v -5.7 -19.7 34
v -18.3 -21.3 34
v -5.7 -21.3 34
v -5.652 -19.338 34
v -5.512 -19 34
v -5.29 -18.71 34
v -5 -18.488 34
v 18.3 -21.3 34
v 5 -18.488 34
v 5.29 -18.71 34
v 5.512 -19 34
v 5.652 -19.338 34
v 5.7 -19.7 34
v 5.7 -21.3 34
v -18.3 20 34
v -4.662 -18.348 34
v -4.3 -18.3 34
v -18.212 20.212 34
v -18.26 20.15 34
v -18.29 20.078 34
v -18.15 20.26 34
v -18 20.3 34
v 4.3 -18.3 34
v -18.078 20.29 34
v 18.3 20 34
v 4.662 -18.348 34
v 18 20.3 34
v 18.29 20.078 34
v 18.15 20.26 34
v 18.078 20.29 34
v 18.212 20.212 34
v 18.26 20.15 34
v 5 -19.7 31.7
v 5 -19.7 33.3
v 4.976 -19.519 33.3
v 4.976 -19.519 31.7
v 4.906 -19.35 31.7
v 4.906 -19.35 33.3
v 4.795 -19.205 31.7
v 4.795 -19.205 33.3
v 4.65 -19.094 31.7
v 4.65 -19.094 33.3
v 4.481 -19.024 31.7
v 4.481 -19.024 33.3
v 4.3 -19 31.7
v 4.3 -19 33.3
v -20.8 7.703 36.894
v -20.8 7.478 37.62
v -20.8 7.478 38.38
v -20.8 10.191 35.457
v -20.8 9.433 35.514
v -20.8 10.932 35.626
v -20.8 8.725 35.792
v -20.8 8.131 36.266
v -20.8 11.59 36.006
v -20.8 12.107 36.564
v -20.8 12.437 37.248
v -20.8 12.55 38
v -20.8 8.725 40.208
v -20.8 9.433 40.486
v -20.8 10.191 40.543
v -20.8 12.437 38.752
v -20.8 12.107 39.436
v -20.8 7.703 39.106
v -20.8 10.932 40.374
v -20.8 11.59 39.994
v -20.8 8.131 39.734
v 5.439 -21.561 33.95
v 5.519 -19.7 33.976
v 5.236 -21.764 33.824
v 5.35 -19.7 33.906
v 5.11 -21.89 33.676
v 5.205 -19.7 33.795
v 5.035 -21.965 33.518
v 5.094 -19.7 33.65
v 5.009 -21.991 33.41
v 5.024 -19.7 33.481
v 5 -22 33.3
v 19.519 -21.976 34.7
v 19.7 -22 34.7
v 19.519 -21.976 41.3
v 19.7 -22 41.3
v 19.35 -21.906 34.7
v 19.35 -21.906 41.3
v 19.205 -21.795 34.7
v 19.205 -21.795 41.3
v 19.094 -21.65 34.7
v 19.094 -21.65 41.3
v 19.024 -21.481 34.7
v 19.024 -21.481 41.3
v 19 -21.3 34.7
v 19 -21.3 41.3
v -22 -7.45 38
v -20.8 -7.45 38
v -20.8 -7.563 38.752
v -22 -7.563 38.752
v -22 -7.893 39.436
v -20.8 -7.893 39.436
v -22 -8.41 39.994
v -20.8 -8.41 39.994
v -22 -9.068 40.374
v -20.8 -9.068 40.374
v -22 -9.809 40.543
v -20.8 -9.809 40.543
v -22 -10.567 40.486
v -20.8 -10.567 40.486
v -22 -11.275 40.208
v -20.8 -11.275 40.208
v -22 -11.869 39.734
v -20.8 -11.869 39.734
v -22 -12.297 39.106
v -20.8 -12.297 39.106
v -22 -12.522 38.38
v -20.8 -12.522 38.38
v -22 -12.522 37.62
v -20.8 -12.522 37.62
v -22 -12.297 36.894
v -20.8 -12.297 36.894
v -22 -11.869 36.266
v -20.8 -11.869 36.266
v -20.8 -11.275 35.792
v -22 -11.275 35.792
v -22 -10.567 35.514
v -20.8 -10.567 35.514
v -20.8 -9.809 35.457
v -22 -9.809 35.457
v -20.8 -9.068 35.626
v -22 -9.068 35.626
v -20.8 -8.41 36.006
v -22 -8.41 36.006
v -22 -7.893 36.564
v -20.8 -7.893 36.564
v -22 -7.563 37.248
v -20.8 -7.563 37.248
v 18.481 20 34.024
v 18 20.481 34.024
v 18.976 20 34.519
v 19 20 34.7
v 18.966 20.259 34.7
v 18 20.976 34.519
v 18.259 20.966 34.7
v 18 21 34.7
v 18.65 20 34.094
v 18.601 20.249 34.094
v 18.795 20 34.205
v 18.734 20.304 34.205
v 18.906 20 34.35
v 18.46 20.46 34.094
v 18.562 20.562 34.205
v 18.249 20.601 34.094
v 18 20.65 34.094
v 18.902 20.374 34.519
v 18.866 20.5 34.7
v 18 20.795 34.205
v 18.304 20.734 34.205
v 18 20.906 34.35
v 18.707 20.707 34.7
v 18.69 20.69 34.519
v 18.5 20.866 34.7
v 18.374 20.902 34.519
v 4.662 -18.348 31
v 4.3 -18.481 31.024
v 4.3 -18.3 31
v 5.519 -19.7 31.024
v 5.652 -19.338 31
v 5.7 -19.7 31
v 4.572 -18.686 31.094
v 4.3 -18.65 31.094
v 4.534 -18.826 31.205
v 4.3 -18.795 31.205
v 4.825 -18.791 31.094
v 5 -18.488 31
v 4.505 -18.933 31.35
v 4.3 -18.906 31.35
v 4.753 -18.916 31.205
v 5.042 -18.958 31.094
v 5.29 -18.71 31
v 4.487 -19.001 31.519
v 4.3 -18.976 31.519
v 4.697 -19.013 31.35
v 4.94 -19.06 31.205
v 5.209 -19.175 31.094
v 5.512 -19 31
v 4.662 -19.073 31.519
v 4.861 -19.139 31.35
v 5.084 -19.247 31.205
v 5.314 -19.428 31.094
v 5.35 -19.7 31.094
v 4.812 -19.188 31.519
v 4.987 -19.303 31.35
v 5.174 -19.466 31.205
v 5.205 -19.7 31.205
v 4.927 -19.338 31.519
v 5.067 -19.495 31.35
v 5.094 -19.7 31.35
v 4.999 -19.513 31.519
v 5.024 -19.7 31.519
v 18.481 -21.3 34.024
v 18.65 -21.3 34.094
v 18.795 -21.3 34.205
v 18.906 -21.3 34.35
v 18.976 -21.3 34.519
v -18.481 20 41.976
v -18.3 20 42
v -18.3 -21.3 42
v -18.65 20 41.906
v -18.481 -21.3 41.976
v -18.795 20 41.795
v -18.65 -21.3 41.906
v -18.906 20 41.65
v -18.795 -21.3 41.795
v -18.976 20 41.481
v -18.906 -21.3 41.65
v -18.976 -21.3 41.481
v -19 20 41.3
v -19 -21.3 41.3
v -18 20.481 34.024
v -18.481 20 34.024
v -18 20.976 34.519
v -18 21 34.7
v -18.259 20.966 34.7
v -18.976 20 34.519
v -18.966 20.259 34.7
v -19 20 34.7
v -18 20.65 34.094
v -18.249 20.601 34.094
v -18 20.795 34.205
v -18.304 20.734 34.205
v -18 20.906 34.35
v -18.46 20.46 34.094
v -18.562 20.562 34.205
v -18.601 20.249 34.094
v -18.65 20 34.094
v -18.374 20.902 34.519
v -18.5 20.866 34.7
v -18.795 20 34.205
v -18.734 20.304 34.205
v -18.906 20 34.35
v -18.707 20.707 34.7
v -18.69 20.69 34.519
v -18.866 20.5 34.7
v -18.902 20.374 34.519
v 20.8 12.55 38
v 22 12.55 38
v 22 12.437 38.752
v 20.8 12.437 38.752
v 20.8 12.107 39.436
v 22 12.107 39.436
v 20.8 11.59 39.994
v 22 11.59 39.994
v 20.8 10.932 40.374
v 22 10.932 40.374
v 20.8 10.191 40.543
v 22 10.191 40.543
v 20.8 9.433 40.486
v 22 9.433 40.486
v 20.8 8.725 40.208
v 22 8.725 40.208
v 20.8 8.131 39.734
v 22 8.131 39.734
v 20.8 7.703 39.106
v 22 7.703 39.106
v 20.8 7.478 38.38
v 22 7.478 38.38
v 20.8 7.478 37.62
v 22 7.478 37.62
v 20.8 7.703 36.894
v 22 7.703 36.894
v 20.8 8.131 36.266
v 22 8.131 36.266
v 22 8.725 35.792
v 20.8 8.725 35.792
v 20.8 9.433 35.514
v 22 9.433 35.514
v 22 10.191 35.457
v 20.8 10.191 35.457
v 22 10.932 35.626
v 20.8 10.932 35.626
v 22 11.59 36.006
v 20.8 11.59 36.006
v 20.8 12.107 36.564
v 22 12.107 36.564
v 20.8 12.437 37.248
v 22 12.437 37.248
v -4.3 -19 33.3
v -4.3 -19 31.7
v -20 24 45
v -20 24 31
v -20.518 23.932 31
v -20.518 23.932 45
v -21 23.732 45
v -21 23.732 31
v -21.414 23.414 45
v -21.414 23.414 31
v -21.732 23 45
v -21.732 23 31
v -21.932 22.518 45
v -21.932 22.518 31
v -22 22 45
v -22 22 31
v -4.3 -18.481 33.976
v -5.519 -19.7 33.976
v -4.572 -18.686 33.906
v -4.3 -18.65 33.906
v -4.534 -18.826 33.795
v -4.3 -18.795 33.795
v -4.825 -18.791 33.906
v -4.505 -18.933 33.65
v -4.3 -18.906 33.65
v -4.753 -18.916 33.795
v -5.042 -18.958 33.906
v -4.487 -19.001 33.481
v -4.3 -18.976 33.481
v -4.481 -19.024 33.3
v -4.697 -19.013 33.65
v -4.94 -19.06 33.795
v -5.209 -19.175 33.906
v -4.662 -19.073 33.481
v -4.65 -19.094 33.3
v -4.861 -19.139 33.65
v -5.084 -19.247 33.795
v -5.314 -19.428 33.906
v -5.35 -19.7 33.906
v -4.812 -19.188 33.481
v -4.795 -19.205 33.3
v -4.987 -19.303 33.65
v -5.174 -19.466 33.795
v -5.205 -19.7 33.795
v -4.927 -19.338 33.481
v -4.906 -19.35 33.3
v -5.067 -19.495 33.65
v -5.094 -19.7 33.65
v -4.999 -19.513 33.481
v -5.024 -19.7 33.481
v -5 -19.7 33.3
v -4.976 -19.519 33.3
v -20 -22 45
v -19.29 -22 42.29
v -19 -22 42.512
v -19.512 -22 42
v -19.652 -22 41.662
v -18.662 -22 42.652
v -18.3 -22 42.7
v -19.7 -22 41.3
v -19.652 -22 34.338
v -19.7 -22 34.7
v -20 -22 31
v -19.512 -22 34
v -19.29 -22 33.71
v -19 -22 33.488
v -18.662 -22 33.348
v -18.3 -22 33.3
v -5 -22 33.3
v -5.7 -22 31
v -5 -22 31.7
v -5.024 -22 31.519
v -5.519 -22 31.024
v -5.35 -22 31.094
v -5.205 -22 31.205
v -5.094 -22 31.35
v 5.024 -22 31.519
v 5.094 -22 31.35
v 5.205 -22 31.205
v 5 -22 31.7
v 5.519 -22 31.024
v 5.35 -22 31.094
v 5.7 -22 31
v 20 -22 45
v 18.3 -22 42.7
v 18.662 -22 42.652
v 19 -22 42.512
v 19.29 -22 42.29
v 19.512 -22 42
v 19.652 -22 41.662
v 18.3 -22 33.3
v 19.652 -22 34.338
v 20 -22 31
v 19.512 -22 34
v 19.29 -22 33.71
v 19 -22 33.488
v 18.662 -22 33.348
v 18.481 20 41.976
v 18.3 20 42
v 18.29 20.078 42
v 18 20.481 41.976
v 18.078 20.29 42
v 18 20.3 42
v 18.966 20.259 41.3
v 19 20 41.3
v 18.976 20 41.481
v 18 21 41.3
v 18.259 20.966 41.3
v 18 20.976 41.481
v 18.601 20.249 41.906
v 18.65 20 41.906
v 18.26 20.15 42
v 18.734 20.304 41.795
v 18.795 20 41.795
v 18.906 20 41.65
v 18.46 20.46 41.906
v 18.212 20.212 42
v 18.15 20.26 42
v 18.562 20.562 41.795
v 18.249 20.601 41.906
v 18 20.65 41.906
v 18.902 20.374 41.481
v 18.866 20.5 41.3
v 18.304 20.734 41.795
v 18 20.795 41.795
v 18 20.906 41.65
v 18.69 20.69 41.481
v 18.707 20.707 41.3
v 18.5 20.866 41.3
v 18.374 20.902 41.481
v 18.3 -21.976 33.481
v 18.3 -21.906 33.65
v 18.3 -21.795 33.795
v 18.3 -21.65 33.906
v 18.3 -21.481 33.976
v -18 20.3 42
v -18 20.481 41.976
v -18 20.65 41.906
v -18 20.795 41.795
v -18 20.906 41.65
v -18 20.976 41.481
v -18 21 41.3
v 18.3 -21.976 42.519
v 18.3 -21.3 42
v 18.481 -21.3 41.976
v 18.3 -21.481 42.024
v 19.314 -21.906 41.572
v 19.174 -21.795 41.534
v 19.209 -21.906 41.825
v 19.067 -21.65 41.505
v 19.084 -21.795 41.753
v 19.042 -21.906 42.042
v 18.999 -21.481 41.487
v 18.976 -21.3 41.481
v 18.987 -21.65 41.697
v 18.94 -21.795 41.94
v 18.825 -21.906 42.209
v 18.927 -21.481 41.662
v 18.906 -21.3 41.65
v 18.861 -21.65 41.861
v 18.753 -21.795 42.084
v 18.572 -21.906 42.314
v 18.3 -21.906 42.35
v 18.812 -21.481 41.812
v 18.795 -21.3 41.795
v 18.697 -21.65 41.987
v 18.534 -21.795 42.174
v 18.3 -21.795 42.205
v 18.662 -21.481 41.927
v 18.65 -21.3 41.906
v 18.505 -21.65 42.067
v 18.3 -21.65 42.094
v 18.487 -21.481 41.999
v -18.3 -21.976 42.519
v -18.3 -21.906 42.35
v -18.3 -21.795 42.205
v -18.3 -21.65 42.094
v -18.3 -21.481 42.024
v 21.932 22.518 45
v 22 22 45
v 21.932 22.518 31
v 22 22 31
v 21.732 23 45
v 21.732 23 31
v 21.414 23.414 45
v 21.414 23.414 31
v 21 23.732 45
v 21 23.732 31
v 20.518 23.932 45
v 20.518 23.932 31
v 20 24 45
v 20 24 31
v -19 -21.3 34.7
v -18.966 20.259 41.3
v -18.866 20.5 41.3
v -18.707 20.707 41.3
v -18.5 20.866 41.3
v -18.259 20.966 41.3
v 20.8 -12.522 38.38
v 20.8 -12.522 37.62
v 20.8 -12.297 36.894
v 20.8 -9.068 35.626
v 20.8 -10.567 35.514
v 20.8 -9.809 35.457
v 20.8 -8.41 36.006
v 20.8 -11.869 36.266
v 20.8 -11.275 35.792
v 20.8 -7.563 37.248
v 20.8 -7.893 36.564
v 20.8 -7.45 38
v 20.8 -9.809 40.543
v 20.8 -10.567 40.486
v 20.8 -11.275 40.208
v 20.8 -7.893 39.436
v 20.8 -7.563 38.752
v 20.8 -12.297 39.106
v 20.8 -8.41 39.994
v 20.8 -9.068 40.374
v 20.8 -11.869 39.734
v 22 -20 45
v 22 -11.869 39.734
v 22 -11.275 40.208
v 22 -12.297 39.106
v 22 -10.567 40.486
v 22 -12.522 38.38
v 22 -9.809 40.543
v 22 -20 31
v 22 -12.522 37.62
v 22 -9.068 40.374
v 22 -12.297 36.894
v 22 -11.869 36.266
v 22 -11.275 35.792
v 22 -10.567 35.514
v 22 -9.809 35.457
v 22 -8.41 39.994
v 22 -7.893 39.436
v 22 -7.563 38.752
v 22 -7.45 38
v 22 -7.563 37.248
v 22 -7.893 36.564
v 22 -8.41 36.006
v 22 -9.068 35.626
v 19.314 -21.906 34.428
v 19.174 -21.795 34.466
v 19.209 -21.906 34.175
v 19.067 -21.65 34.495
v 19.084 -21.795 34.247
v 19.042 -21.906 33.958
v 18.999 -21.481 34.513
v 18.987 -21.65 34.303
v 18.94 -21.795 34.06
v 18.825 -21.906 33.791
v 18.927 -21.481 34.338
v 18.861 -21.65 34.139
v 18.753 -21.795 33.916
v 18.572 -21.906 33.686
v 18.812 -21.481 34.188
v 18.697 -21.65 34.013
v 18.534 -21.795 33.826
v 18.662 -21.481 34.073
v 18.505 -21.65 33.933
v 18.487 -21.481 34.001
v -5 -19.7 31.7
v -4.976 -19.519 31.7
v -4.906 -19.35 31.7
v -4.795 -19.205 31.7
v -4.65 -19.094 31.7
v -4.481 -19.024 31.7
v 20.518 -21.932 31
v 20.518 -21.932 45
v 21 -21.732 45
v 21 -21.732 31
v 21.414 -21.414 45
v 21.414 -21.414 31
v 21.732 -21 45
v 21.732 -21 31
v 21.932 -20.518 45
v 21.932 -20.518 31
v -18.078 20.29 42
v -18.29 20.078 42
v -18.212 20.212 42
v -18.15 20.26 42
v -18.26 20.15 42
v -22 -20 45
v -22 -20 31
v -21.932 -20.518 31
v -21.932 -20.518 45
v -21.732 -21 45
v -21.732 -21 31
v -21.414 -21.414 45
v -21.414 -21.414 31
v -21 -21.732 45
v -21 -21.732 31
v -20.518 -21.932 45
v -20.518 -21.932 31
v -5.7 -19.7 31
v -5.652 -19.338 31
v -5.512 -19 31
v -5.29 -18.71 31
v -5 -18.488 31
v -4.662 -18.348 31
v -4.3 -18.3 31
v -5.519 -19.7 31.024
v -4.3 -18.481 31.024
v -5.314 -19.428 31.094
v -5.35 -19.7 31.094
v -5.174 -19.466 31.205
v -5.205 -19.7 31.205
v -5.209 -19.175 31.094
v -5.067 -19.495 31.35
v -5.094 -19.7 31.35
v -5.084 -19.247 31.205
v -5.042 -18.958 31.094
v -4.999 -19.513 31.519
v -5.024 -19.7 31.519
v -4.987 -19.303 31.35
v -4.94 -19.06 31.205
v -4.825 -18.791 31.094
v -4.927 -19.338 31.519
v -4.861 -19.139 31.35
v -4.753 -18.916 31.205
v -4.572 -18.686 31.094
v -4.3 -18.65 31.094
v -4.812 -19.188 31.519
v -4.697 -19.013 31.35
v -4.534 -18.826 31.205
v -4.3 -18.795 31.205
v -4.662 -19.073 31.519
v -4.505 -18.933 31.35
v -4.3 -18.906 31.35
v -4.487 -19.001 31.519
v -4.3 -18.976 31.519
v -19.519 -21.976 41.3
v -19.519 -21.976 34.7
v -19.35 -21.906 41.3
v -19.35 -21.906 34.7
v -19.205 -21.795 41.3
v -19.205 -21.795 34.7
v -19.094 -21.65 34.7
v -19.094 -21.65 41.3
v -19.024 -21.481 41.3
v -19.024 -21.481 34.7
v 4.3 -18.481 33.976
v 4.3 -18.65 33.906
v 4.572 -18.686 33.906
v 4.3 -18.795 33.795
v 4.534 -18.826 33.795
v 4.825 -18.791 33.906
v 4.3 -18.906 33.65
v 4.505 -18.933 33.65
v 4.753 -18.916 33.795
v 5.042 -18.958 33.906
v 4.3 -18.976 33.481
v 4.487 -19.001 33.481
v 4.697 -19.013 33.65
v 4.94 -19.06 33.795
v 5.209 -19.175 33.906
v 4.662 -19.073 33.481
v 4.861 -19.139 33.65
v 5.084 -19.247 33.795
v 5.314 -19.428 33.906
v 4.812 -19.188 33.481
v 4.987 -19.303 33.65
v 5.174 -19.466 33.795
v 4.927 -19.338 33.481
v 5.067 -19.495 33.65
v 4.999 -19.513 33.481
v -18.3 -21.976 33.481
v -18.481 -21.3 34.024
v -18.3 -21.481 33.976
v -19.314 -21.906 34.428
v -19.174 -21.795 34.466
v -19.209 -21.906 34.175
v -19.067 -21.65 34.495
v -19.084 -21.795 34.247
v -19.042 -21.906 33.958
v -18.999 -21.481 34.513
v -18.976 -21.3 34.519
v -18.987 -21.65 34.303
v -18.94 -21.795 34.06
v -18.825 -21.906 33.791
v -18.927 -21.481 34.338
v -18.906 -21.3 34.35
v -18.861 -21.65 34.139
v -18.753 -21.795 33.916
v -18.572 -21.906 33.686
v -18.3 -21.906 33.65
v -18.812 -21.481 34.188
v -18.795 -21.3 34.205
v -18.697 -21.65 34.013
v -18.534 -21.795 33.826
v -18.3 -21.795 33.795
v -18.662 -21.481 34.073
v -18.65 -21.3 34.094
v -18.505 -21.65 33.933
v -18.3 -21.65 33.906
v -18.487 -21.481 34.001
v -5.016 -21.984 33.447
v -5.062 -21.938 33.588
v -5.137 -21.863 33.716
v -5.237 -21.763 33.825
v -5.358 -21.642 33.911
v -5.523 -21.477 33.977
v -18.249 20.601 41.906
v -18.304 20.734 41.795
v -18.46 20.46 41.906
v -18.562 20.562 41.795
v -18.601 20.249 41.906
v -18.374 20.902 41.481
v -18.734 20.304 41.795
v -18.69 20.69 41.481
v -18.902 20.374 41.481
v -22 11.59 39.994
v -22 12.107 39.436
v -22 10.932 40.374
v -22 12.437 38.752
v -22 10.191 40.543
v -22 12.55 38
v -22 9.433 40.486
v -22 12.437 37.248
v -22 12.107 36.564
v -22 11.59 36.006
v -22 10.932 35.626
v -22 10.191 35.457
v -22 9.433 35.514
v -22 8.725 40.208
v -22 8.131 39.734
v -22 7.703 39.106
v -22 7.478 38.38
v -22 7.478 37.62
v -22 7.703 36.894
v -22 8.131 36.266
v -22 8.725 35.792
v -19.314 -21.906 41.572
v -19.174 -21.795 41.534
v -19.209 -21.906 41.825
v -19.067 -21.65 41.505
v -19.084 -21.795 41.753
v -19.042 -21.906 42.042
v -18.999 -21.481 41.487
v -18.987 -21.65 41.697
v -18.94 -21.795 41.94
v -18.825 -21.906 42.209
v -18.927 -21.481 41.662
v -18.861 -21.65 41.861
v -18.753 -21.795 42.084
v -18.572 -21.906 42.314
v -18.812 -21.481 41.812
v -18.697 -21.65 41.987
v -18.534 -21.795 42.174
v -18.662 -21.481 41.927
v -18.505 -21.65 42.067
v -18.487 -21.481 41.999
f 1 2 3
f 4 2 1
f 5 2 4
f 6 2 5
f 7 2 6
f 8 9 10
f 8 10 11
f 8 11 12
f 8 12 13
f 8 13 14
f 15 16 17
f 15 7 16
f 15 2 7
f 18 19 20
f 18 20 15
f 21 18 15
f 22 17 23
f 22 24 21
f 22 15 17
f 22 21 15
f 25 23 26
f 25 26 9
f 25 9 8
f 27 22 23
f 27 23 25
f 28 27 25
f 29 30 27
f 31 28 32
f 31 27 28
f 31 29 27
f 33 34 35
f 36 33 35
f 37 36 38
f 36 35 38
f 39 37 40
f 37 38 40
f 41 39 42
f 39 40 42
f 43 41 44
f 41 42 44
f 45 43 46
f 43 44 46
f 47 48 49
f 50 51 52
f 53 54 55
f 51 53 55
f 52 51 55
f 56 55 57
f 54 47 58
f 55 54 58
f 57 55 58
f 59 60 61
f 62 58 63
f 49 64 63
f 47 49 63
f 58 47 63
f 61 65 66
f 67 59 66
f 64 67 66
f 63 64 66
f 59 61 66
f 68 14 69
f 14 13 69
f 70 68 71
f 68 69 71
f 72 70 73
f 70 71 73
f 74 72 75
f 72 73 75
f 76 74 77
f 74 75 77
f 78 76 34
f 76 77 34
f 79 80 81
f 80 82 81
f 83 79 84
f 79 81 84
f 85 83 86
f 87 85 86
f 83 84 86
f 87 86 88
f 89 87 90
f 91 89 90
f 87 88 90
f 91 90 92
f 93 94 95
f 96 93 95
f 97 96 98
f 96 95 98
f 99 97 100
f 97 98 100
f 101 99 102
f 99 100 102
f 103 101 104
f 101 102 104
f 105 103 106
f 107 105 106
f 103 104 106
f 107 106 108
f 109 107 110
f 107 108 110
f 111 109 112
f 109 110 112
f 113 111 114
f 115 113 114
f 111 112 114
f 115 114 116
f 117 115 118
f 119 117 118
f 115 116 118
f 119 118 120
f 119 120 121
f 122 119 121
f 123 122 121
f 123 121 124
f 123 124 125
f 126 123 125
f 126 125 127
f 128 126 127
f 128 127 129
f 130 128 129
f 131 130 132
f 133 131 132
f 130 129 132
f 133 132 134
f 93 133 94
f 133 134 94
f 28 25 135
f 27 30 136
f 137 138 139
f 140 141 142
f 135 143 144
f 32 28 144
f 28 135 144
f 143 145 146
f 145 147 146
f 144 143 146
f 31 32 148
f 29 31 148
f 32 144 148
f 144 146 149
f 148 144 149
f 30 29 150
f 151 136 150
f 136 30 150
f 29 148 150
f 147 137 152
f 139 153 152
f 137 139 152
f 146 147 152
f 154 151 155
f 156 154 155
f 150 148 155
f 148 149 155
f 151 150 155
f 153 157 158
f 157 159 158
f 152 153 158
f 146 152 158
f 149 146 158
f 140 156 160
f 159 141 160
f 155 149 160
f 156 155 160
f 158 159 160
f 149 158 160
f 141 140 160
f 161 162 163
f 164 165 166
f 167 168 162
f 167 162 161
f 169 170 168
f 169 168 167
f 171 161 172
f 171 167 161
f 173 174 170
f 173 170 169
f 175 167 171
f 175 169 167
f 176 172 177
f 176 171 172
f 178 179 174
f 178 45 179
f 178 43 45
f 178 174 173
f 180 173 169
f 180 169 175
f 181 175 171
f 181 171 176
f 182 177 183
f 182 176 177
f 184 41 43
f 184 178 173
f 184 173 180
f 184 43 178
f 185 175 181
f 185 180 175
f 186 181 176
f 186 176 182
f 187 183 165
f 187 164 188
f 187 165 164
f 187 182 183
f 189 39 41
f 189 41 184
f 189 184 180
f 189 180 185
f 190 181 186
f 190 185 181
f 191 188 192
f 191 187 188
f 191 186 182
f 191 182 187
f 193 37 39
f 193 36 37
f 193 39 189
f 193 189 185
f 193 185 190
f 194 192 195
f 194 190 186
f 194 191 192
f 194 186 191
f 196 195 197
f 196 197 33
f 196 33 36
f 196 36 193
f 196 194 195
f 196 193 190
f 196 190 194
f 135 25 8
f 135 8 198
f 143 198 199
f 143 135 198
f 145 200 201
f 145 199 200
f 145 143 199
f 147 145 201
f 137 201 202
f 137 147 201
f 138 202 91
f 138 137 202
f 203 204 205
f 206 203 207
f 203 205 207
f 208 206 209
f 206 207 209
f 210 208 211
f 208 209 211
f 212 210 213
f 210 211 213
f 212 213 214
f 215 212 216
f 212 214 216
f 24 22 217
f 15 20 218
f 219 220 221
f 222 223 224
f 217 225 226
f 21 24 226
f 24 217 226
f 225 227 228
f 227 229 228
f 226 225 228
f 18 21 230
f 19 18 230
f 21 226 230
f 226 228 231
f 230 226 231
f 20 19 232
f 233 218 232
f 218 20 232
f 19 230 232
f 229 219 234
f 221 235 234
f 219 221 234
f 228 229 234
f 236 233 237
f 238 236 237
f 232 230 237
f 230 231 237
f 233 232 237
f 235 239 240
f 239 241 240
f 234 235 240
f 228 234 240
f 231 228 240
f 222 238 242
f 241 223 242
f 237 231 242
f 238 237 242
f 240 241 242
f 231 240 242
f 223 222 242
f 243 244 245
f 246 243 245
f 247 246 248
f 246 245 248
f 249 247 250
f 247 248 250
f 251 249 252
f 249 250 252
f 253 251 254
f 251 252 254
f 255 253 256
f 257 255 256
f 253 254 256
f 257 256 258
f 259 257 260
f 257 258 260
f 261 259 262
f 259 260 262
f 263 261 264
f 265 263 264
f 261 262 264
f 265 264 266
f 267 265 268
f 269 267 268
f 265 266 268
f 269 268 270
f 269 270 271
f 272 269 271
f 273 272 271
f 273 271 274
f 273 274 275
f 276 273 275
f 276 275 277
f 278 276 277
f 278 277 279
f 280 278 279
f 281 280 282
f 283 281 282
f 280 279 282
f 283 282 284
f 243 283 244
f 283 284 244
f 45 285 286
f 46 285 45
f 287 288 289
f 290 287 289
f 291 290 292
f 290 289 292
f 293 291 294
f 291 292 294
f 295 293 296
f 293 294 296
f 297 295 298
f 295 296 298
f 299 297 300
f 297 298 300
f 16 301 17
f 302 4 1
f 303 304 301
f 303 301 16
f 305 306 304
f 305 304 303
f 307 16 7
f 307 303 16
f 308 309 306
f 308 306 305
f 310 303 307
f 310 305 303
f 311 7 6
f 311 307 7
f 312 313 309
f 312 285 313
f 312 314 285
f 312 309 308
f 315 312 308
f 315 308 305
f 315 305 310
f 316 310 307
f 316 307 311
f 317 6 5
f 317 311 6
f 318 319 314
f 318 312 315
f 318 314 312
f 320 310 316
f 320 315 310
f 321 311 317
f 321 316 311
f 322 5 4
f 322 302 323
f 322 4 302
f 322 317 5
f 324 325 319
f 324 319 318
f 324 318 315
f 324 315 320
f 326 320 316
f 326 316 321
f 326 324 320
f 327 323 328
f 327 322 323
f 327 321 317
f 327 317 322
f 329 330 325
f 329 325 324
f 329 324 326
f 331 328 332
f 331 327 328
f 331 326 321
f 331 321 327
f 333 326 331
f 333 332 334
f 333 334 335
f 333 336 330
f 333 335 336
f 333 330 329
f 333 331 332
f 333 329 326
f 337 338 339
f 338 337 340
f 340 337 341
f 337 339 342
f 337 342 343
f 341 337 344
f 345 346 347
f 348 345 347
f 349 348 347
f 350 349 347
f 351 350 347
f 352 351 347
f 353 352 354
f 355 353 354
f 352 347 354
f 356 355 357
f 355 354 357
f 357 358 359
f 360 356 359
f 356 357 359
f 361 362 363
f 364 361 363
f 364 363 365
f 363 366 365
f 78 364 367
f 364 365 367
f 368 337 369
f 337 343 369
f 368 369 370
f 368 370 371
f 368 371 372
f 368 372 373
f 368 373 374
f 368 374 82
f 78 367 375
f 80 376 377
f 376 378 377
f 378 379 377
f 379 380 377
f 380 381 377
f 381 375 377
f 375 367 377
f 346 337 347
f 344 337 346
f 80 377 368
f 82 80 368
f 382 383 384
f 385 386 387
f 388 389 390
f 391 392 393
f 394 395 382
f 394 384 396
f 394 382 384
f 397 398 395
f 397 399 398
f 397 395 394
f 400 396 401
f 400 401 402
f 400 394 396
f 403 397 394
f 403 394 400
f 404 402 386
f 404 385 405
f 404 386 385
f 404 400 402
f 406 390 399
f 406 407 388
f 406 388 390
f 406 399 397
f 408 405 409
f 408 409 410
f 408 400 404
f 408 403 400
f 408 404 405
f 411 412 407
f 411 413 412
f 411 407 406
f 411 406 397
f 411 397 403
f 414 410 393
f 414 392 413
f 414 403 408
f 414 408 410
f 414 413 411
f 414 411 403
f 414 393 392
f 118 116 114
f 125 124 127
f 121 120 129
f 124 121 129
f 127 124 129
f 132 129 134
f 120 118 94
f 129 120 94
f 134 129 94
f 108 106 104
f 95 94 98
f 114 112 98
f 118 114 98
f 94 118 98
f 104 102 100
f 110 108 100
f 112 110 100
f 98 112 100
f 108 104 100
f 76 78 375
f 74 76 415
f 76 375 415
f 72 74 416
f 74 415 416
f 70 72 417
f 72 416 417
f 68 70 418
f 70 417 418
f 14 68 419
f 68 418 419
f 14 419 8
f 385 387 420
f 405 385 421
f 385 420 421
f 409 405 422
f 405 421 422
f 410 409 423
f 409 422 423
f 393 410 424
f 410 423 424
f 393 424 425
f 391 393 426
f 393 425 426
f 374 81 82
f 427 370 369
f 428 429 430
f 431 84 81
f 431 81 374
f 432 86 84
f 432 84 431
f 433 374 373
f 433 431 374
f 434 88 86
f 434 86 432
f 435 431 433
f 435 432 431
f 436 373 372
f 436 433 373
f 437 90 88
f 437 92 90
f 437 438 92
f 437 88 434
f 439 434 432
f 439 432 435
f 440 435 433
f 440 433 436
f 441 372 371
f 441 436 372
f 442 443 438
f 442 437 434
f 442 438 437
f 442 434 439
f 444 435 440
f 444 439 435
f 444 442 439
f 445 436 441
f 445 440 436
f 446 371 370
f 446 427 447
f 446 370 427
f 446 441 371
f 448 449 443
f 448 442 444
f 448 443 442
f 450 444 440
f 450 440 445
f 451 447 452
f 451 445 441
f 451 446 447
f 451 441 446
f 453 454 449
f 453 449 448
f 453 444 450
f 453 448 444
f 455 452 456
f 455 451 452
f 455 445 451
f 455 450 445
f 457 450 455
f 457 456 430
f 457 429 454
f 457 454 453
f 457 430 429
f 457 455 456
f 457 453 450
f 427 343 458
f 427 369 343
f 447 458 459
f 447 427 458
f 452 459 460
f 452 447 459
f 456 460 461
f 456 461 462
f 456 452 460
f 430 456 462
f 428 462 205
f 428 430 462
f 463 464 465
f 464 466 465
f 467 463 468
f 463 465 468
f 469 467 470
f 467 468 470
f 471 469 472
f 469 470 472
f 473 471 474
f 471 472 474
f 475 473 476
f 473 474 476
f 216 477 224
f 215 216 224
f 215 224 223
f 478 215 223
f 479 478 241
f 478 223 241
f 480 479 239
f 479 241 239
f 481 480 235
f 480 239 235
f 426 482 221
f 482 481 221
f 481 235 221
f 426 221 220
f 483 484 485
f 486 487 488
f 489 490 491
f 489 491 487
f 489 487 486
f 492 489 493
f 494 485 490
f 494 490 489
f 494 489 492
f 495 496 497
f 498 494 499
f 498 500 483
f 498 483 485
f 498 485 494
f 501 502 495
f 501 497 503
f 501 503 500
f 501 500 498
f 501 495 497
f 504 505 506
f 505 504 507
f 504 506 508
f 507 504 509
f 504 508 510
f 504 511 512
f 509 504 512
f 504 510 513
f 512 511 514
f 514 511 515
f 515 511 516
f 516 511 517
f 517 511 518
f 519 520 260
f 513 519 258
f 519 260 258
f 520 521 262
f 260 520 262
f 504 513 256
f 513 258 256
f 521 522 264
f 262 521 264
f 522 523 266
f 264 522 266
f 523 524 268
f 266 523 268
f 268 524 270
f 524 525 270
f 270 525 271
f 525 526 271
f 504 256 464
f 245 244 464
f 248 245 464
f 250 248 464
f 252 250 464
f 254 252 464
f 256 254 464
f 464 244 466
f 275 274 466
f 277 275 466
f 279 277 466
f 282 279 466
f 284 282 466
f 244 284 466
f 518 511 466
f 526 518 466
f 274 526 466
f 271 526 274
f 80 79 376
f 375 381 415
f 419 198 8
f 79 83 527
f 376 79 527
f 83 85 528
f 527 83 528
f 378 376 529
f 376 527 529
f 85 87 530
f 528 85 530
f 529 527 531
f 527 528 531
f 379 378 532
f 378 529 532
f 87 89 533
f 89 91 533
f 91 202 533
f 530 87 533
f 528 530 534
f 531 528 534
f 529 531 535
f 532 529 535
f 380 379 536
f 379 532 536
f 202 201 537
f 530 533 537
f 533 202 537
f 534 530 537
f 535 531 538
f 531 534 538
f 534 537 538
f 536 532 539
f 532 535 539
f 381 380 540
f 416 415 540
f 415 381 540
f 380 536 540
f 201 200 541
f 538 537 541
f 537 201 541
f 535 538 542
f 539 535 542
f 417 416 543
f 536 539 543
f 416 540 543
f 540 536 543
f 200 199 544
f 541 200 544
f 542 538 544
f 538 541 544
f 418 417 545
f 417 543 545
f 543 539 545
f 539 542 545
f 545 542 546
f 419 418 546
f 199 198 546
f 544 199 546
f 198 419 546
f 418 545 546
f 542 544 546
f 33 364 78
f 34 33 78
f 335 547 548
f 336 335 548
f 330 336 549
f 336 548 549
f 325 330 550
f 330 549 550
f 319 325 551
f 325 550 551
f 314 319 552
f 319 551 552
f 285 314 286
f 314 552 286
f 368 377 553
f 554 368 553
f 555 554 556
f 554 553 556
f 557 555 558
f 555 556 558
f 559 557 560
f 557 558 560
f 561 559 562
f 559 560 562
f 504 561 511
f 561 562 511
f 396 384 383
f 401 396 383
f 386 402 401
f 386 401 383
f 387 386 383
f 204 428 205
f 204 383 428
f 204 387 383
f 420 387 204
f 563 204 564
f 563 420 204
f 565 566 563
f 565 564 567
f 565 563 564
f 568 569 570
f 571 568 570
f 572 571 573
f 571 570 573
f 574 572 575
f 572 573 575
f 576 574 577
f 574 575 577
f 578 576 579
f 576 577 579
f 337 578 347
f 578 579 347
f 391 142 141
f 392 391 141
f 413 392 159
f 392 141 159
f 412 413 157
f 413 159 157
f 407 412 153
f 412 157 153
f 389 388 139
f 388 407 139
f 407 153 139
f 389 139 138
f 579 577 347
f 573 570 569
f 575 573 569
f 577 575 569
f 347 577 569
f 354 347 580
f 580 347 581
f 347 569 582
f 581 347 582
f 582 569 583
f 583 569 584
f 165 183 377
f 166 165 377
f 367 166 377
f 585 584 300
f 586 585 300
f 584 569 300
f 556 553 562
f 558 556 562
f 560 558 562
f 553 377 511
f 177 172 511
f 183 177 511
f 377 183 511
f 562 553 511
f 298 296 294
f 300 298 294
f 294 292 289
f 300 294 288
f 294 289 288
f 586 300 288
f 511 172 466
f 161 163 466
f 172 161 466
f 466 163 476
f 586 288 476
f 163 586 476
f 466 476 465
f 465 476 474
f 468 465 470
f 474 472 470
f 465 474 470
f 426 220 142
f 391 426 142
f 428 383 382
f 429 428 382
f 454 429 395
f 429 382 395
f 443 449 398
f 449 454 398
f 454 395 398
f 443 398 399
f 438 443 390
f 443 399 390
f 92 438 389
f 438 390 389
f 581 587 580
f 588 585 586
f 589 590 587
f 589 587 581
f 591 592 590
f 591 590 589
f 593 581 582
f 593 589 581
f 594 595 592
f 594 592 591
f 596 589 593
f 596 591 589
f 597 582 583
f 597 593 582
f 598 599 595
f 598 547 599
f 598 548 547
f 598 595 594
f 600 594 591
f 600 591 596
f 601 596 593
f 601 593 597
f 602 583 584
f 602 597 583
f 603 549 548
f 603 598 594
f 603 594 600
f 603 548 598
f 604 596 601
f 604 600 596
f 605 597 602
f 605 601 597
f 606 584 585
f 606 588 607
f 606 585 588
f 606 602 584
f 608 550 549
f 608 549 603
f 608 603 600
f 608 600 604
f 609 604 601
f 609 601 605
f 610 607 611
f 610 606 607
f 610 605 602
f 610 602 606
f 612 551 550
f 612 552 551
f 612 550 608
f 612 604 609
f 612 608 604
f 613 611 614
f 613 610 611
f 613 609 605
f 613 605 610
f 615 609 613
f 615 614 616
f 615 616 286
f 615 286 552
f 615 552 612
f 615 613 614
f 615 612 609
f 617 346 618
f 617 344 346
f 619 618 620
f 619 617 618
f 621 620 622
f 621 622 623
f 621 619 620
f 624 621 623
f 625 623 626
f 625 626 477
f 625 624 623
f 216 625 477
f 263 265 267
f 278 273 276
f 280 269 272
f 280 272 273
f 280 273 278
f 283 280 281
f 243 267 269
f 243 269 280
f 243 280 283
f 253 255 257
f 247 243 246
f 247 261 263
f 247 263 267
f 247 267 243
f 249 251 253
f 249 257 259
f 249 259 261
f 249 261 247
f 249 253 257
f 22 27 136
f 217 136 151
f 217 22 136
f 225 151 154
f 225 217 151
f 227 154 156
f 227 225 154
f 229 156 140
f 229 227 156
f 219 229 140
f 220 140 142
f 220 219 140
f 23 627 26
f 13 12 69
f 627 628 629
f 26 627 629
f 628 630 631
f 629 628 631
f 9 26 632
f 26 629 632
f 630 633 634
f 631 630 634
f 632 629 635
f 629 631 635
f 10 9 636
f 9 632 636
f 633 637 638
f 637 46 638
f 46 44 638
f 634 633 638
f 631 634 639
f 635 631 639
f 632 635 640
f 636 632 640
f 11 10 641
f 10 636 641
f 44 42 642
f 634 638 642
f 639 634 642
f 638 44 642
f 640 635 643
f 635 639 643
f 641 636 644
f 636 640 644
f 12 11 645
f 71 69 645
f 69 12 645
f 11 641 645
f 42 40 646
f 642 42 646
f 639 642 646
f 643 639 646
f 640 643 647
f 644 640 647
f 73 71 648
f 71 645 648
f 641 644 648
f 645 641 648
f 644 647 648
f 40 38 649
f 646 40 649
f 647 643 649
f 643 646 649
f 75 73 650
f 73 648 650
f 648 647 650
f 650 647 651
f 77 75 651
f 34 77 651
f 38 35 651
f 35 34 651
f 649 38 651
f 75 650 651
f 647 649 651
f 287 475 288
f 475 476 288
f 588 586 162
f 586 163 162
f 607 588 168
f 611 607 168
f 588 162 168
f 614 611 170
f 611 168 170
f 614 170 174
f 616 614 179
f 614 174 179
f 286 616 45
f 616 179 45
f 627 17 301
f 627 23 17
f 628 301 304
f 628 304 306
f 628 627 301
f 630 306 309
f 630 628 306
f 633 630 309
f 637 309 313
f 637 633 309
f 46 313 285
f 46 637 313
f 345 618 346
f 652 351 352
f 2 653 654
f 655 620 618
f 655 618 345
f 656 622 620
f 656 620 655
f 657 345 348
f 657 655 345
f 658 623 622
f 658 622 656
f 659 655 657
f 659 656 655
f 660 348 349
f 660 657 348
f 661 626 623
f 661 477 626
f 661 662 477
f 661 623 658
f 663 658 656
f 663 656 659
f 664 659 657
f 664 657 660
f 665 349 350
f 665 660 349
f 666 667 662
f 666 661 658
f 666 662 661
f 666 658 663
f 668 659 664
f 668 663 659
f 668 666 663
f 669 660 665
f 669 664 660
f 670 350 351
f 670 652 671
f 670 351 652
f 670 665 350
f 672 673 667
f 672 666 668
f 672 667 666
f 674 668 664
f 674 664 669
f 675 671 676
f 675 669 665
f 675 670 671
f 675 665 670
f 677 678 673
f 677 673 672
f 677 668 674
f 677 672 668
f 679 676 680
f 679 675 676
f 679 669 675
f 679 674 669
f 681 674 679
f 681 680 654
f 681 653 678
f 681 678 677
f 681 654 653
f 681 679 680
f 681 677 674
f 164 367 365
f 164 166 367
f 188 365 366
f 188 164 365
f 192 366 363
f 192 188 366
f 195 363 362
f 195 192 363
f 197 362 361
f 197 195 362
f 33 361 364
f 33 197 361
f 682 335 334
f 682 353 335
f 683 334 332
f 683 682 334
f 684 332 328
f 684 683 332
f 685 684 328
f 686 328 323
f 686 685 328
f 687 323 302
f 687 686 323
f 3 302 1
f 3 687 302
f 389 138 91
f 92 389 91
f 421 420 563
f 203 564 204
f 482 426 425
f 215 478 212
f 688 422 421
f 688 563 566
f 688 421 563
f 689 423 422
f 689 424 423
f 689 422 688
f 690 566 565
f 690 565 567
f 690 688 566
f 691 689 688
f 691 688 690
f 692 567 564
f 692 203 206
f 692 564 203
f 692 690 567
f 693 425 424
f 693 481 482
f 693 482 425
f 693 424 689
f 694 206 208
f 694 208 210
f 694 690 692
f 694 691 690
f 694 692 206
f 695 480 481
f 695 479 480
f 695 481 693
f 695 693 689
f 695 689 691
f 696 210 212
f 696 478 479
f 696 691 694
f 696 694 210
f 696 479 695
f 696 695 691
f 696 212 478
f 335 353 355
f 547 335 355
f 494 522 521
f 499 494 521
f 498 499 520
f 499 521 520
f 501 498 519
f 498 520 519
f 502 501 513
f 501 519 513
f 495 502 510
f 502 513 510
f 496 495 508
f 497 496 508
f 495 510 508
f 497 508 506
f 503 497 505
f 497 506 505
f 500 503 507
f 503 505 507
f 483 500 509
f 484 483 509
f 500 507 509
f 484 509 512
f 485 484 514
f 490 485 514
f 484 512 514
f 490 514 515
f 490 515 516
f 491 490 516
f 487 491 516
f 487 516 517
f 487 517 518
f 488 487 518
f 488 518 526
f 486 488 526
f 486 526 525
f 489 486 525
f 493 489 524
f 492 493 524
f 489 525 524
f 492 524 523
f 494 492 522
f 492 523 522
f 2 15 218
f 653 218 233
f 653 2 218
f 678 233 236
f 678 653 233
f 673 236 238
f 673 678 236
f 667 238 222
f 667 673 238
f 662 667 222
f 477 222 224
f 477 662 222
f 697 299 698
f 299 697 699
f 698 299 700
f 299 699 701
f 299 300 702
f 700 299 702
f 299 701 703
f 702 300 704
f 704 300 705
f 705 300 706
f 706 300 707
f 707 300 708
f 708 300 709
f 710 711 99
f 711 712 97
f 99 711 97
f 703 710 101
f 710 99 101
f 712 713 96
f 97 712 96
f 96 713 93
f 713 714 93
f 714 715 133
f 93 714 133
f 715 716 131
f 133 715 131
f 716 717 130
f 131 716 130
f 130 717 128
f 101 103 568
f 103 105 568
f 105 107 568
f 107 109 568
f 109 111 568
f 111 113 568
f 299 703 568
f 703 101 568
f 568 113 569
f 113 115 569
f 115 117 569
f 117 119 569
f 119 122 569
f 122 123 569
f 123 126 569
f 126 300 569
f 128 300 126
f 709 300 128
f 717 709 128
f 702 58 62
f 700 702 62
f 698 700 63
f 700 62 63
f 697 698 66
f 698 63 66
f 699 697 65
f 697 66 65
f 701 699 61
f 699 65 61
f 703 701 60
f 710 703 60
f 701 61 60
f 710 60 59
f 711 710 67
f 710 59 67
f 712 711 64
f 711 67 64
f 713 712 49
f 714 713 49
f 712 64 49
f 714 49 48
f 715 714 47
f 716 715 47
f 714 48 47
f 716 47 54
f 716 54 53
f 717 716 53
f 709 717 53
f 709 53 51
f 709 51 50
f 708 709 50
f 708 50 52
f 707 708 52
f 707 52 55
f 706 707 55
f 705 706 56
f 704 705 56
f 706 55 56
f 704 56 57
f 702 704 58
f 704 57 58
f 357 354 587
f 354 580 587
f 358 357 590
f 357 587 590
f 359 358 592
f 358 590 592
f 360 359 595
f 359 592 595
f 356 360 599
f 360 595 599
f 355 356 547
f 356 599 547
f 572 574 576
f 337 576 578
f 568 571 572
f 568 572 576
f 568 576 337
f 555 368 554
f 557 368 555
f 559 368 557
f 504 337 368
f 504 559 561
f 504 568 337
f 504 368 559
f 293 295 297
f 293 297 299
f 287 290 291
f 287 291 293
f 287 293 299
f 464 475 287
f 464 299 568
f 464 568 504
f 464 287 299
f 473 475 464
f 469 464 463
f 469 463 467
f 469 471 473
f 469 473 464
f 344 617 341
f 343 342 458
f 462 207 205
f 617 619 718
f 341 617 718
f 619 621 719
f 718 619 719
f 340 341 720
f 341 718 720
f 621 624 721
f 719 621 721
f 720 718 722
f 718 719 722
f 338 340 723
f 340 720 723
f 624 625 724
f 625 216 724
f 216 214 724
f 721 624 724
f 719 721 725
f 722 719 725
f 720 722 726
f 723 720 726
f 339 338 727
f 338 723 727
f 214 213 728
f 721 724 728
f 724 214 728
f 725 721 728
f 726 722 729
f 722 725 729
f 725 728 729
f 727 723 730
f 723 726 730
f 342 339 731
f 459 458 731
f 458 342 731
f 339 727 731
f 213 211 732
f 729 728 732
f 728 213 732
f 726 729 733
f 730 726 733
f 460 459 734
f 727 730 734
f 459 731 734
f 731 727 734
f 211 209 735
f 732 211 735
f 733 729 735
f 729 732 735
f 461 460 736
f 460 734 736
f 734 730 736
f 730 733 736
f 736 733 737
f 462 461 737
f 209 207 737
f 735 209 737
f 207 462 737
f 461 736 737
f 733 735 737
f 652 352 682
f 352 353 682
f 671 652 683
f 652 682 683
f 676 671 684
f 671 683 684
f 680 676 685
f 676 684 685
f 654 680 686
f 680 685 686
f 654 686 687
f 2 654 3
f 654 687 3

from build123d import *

# Parameters (mm, degrees)
BOSS_EXTRUDE4_DEPTH = 3
BOSS_EXTRUDE5_DEPTH = 14
BOSS_EXTRUDE6_START = 11
BOSS_EXTRUDE6_DEPTH = 3
SKETCH2_W           = 10
SKETCH2_H           = 3
CUT_EXTRUDE1_DEPTH  = 3
CUT_EXTRUDE2_START  = 22
SKETCH3_R           = 2.55
CUT_EXTRUDE2_DEPTH  = 1.2
CUT_EXTRUDE3_START  = -20.8
SKETCH3_3_R         = 2.55
CUT_EXTRUDE3_DEPTH  = 1.2
FILLET1_R           = 0.7


with BuildPart() as part:
    # Sketch1 → Boss-Extrude4 (new body)
    with BuildSketch(Plane.XY.offset(31)):
        with BuildLine():
            ThreePointArc((-22, -20), (-21.414213562, -21.414213562), (-20, -22))
            Line((-20, -22), (20, -22))
            ThreePointArc((20, -22), (21.414213562, -21.414213562), (22, -20))
            Line((22, -20), (22, 22))
            ThreePointArc((22, 22), (21.414213562, 23.414213562), (20, 24))
            Line((20, 24), (-20, 24))
            ThreePointArc((-20, 24), (-21.414213562, 23.414213562), (-22, 22))
            Line((-22, 22), (-22, -20))
        make_face()
    extrude(amount=BOSS_EXTRUDE4_DEPTH)

    # Sketch1<3> → Boss-Extrude5 (add)
    with BuildSketch(Plane.XY.offset(31)):
        with BuildLine():
            Line((-22, -10.75), (-22, -20))
            ThreePointArc((-22, -20), (-21.414213562, -21.414213562), (-20, -22))
            Line((-20, -22), (-19, -22))
            Line((-19, -22), (-19, -18))
            Line((-19, -18), (-19, -10.75))
            Line((-19, -10.75), (-19, 10.75))
            Line((-19, 10.75), (-19, 20))
            ThreePointArc((-19, 20), (-18.707106781, 20.707106781), (-18, 21))
            Line((-18, 21), (-3.938916155, 21))
            Line((-3.938916155, 21), (3.938916155, 21))
            Line((3.938916155, 21), (18, 21))
            ThreePointArc((18, 21), (18.707106781, 20.707106781), (19, 20))
            Line((19, 20), (19, 10.75))
            Line((19, 10.75), (19, -10.75))
            Line((19, -10.75), (19, -18))
            Line((19, -18), (19, -22))
            Line((19, -22), (20, -22))
            ThreePointArc((20, -22), (21.414213562, -21.414213562), (22, -20))
            Line((22, -20), (22, -10.75))
            Line((22, -10.75), (22, 10.75))
            Line((22, 10.75), (22, 22))
            ThreePointArc((22, 22), (21.414213562, 23.414213562), (20, 24))
            Line((20, 24), (3.938916155, 24))
            Line((3.938916155, 24), (-3.938916155, 24))
            Line((-3.938916155, 24), (-20, 24))
            ThreePointArc((-20, 24), (-21.414213562, 23.414213562), (-22, 22))
            Line((-22, 22), (-22, 10.75))
            Line((-22, 10.75), (-22, -10.75))
        make_face()
    extrude(amount=BOSS_EXTRUDE5_DEPTH)

    # Sketch1<4> → Boss-Extrude6 (add)
    # profile 1 of 3: a face of its own
    with BuildSketch(Plane.XY.offset(31).offset(BOSS_EXTRUDE6_START)):
        with BuildLine():
            Line((-22, -20), (-22, -10.75))
            Line((-22, -10.75), (-22, 10.75))
            Line((-22, 10.75), (-22, 22))
            ThreePointArc((-22, 22), (-21.414213562, 23.414213562), (-20, 24))
            Line((-20, 24), (-3.938916155, 24))
            Line((-3.938916155, 24), (3.938916155, 24))
            Line((3.938916155, 24), (20, 24))
            ThreePointArc((20, 24), (21.414213562, 23.414213562), (22, 22))
            Line((22, 22), (22, 10.75))
            Line((22, 10.75), (22, -10.75))
            Line((22, -10.75), (22, -20))
            ThreePointArc((22, -20), (21.414213562, -21.414213562), (20, -22))
            Line((20, -22), (10.75, -22))
            Line((10.75, -22), (-10.75, -22))
            Line((-10.75, -22), (-20, -22))
            ThreePointArc((-20, -22), (-21.414213562, -21.414213562), (-22, -20))
        make_face()
        with BuildLine():
            ThreePointArc((-18, 21), (-18.707106781, 20.707106781), (-19, 20))
            Line((-19, 20), (-19, 10.75))
            Line((-19, 10.75), (-19, -10.75))
            Line((-19, -10.75), (-19, -18))
            ThreePointArc((-19, -18), (-18.707106781, -18.707106781), (-18, -19))
            Line((-18, -19), (-10.75, -19))
            Line((-10.75, -19), (10.75, -19))
            Line((10.75, -19), (18, -19))
            ThreePointArc((18, -19), (18.707106781, -18.707106781), (19, -18))
            Line((19, -18), (19, -10.75))
            Line((19, -10.75), (19, 10.75))
            Line((19, 10.75), (19, 20))
            ThreePointArc((19, 20), (18.707106781, 20.707106781), (18, 21))
            Line((18, 21), (3.938916155, 21))
            Line((3.938916155, 21), (-3.938916155, 21))
            Line((-3.938916155, 21), (-18, 21))
        make_face(mode=Mode.SUBTRACT)
    # profile 2 of 3: a face of its own
    with BuildSketch(Plane.XY.offset(31).offset(BOSS_EXTRUDE6_START)):
        with BuildLine():
            Line((-18, 21), (-3.938916155, 21))
            Line((-3.938916155, 21), (3.938916155, 21))
            Line((3.938916155, 21), (18, 21))
            ThreePointArc((18, 21), (18.707106781, 20.707106781), (19, 20))
            Line((19, 20), (19, 10.75))
            Line((19, 10.75), (19, -10.75))
            Line((19, -10.75), (19, -18))
            ThreePointArc((19, -18), (18.707106781, -18.707106781), (18, -19))
            Line((18, -19), (10.75, -19))
            Line((10.75, -19), (-10.75, -19))
            Line((-10.75, -19), (-18, -19))
            ThreePointArc((-18, -19), (-18.707106781, -18.707106781), (-19, -18))
            Line((-19, -18), (-19, -10.75))
            Line((-19, -10.75), (-19, 10.75))
            Line((-19, 10.75), (-19, 20))
            ThreePointArc((-19, 20), (-18.707106781, 20.707106781), (-18, 21))
        make_face()
    # profile 3 of 3: a face of its own
    with BuildSketch(Plane.XY.offset(31).offset(BOSS_EXTRUDE6_START)):
        with BuildLine():
            Line((-19, -18), (-19, -22))
            Line((-19, -22), (-10.75, -22))
            Line((-10.75, -22), (10.75, -22))
            Line((10.75, -22), (19, -22))
            Line((19, -22), (19, -18))
            ThreePointArc((19, -18), (18.707106781, -18.707106781), (18, -19))
            Line((18, -19), (10.75, -19))
            Line((10.75, -19), (-10.75, -19))
            Line((-10.75, -19), (-18, -19))
            ThreePointArc((-18, -19), (-18.707106781, -18.707106781), (-19, -18))
        make_face()
    extrude(amount=BOSS_EXTRUDE6_DEPTH)

    # Sketch2 → Cut-Extrude1 (cut)
    with BuildSketch(Plane.XZ.offset(22)):
        with Locations((0, 32.5)):
            Rectangle(SKETCH2_W, SKETCH2_H)
        with Locations((0, 35.5)):
            Rectangle(SKETCH2_W, SKETCH2_H)
    extrude(amount=-CUT_EXTRUDE1_DEPTH, mode=Mode.SUBTRACT)

    # Sketch3 → Cut-Extrude2 (cut)
    with BuildSketch(Plane(origin=(0, 0, 0), x_dir=(0, 0, -1), z_dir=(1, 0, 0)).offset(CUT_EXTRUDE2_START)):
        with Locations(Location((-38, 10, 0), (0, 0, 90))):
            Circle(SKETCH3_R)
        with Locations(Location((-38, -10, 0), (0, 0, 90))):
            Circle(SKETCH3_R)
    extrude(amount=-CUT_EXTRUDE2_DEPTH, mode=Mode.SUBTRACT)

    # Sketch3<3> → Cut-Extrude3 (cut)
    with BuildSketch(Plane(origin=(0, 0, 0), x_dir=(0, 0, -1), z_dir=(1, 0, 0)).offset(CUT_EXTRUDE3_START)):
        with Locations(Location((-38, -10, 0), (0, 0, 90))):
            Circle(SKETCH3_3_R)
        with Locations(Location((-38, 10, 0), (0, 0, 90))):
            Circle(SKETCH3_3_R)
    extrude(amount=-CUT_EXTRUDE3_DEPTH, mode=Mode.SUBTRACT)

    # Fillet1
    fillet1_edges = [part.edges().sort_by_distance(p)[0] for p in [
        (-19, -22, 38),
        (0, -22, 42),
        (0, 21, 42),
        (19, -1, 42),
        (-19, -1, 42),
        (18.707106781, 20.707106781, 42),
        (-12, -22, 34),
        (-5, -20.5, 34),
        (5, -20.5, 34),
        (0, -19, 31),
        (5, -20.5, 31),
        (-5, -19, 32.5),
        (-5, -20.5, 31),
        (5, -19, 32.5),
        (0, -19, 34),
        (12, -22, 34),
        (19, -1, 34),
        (0, 21, 34),
        (-19, -1, 34),
        (18.707106781, 20.707106781, 34),
        (-18.707106781, 20.707106781, 34),
        (-18.707106781, 20.707106781, 42),
        (19, -22, 38),
    ]]
    fillet(fillet1_edges, radius=FILLET1_R)


solid = part.part
